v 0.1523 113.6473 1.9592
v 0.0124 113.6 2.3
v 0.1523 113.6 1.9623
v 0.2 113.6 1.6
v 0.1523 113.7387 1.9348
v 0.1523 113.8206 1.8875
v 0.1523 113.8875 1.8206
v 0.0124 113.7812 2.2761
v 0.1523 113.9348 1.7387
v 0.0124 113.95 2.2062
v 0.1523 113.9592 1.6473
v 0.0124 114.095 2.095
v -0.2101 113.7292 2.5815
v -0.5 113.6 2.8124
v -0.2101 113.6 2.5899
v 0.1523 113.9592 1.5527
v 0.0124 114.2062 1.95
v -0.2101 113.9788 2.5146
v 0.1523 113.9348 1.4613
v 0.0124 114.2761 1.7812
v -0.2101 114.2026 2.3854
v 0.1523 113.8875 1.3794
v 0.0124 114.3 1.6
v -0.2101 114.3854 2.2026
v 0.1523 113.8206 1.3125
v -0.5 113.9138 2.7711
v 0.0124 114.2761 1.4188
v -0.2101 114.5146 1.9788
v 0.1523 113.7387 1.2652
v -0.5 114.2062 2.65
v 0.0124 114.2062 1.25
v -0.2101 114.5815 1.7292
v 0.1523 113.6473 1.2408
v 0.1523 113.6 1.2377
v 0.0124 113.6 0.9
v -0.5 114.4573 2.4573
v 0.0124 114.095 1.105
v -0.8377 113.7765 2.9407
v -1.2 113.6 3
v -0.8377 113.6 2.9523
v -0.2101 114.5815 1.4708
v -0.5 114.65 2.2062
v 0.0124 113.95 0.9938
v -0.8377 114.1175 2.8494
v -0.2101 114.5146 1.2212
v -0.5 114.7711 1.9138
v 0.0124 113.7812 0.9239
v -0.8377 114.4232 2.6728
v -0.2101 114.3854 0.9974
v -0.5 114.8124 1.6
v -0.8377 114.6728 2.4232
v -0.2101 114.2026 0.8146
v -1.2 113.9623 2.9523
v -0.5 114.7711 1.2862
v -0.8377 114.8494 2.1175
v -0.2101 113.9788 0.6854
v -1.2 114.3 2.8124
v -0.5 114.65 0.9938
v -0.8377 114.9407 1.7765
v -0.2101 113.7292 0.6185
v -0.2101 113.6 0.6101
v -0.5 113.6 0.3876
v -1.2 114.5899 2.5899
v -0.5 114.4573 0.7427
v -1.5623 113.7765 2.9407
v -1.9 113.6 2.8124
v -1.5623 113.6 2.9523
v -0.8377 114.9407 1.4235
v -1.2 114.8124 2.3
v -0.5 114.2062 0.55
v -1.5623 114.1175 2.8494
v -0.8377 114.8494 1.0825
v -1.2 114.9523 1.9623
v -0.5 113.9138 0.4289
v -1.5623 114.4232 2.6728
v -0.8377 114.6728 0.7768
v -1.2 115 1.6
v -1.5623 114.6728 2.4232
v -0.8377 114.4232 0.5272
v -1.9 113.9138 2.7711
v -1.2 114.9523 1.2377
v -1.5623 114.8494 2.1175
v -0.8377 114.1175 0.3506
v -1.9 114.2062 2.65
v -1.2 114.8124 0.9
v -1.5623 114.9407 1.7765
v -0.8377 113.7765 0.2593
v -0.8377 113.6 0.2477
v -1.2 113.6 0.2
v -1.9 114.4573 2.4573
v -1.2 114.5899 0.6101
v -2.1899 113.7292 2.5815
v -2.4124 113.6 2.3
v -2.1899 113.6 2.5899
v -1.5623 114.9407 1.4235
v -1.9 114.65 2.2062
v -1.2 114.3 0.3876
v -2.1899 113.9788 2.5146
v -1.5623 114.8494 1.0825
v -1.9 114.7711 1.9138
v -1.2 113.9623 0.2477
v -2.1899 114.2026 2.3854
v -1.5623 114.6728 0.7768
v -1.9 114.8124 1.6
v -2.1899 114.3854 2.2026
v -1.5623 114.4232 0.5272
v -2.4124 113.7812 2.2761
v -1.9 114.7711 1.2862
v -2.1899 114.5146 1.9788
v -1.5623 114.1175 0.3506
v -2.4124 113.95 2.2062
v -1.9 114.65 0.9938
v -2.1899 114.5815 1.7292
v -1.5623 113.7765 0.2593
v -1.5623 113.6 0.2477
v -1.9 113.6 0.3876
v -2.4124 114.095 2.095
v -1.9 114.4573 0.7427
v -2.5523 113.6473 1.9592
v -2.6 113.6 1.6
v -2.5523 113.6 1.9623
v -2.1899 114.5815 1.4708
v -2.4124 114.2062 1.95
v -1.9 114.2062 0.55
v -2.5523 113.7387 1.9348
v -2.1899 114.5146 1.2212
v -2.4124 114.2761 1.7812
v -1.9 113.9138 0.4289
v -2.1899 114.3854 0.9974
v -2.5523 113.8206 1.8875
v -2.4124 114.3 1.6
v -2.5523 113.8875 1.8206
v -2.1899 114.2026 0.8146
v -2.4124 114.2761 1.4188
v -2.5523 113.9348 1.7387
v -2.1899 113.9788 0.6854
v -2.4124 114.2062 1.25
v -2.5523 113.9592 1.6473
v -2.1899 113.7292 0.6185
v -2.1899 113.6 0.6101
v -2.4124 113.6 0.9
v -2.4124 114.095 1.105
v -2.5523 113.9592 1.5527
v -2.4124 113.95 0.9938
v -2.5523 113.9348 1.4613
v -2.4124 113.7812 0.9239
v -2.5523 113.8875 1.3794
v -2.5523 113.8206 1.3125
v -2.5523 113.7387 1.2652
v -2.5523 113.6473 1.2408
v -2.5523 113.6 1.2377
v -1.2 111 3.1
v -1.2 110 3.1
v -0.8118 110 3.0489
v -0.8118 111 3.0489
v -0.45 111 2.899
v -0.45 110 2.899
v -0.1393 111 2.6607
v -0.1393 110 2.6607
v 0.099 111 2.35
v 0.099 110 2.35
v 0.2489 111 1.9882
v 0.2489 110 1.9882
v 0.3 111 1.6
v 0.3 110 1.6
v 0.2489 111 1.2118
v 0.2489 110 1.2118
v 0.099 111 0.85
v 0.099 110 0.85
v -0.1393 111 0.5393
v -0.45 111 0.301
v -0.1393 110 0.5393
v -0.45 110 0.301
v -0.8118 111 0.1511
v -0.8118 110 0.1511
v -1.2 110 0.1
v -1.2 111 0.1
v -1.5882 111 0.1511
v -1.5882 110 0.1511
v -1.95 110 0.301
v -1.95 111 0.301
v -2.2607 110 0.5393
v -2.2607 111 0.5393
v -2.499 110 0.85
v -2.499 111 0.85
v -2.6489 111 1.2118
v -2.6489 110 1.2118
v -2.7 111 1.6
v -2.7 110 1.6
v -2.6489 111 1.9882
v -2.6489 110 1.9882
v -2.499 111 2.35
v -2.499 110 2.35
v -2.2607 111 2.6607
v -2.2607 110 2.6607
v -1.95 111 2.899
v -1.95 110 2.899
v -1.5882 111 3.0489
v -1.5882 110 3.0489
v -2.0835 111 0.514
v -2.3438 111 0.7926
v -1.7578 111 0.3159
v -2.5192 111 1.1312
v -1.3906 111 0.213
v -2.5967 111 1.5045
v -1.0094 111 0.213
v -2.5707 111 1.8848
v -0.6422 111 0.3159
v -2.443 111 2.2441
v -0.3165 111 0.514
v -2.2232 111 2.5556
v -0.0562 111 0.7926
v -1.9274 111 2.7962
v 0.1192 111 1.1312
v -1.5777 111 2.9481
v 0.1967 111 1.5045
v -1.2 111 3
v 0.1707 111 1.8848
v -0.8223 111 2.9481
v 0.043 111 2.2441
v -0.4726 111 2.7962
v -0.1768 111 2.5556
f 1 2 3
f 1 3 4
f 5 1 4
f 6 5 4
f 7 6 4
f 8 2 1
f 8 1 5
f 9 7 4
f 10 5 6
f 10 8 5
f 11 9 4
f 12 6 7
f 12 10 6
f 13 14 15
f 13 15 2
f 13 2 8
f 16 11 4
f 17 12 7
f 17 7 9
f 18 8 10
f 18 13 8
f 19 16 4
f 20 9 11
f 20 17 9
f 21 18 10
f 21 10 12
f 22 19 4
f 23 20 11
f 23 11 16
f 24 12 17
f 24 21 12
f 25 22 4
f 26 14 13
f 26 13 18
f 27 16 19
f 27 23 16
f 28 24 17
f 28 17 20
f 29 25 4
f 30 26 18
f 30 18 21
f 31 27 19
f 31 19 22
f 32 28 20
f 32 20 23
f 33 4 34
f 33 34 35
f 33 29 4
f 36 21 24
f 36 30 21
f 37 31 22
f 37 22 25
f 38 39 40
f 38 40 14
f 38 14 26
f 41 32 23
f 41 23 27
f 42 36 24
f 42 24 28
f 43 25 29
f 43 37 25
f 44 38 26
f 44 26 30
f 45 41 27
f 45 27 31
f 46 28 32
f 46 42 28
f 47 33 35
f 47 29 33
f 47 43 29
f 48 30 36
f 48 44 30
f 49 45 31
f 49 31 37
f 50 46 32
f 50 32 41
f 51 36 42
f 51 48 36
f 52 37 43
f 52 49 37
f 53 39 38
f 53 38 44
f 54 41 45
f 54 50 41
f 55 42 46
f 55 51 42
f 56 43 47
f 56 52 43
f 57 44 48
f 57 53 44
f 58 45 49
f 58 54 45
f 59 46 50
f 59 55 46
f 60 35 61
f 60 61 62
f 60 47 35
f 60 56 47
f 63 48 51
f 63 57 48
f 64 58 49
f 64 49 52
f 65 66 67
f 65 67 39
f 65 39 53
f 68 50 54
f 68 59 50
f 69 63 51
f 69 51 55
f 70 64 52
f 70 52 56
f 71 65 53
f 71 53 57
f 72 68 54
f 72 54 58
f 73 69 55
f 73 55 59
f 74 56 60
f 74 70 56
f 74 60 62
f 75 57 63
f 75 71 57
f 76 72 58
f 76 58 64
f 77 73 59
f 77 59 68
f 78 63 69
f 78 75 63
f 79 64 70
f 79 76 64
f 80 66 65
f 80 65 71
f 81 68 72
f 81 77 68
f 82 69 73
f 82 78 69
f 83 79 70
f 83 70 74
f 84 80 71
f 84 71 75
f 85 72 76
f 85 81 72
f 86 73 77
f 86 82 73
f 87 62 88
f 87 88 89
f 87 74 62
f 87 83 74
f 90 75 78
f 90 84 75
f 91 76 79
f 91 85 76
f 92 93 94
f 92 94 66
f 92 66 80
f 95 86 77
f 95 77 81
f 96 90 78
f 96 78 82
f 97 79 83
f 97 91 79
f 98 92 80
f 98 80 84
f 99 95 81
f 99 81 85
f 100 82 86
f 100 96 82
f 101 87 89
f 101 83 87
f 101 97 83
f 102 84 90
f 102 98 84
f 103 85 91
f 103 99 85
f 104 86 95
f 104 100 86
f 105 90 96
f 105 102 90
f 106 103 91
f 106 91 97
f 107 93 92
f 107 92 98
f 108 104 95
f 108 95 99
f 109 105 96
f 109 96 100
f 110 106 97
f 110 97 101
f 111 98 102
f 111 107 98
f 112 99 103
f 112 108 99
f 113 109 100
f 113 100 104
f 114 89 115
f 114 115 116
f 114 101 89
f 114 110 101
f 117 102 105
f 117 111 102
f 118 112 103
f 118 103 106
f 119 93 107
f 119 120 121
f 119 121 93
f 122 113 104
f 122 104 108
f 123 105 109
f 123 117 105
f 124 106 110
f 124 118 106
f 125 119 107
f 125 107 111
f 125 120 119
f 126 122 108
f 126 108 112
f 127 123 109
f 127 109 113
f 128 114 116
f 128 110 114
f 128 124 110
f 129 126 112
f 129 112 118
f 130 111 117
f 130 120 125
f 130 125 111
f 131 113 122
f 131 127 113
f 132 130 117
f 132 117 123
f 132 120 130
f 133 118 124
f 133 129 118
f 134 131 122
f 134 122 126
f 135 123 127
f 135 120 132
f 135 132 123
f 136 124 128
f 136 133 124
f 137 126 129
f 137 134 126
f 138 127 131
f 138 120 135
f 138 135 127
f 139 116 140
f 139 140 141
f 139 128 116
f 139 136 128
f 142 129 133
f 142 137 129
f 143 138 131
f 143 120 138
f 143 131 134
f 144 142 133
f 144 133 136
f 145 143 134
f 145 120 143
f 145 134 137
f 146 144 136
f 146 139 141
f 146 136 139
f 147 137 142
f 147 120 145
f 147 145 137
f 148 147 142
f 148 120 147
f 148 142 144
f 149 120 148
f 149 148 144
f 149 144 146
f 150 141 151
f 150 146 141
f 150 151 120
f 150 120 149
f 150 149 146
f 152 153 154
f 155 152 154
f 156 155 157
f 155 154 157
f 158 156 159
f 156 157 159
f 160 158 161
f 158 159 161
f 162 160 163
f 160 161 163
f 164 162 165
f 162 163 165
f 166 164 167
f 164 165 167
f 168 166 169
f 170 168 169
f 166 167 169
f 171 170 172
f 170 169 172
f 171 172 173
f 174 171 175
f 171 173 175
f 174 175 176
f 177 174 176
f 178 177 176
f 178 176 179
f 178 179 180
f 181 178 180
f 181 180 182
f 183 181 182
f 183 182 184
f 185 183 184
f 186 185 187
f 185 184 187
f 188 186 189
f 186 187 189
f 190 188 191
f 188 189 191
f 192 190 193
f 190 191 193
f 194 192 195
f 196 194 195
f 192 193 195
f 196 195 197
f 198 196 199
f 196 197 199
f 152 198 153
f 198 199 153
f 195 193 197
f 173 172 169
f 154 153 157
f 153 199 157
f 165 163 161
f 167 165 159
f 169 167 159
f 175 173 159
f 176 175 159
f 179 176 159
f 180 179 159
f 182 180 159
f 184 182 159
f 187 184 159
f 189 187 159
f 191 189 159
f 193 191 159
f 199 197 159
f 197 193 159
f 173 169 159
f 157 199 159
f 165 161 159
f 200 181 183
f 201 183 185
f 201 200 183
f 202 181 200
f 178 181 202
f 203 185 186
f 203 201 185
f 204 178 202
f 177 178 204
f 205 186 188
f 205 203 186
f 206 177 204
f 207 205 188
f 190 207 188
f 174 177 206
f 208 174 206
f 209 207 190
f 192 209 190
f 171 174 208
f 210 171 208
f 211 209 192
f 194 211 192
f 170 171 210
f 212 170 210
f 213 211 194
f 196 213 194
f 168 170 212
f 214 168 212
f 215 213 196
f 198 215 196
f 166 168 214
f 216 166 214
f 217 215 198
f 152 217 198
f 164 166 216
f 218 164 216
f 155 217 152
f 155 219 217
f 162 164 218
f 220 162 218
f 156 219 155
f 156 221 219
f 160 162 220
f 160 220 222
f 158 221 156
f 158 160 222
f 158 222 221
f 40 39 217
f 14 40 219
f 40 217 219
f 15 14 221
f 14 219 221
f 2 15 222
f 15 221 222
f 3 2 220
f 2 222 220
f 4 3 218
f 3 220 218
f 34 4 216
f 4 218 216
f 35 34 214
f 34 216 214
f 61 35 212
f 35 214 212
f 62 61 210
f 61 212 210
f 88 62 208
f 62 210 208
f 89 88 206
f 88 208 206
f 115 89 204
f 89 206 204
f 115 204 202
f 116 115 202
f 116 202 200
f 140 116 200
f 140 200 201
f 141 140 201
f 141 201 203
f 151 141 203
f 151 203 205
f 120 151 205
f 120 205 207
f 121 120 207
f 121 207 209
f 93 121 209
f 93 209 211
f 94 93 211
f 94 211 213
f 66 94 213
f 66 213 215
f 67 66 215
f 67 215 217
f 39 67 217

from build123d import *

# Parameters (mm, degrees)
CYLINDER002_R          = 1.5
CYLINDER002_DEPTH      = 1
SPHERE_ANGLE           = 180
SPHERE_ROLL_ANGLE      = 90
CYLINDER003_R          = 1.4
CYLINDER003_DEPTH      = 3.6
FUSION_PITCH_ANGLE     = -90
FUSION_PLACEMENT_ANGLE = -90


with BuildPart() as cilindro002:
    # Cylinder002 → Cylinder002 (new body)
    with BuildSketch(Plane.XY):
        Circle(CYLINDER002_R)
    extrude(amount=CYLINDER002_DEPTH)


with BuildPart() as esf_ra:
    # Sphere → Sphere (revolve)
    with BuildSketch(Plane.XZ):
        with BuildLine():
            ThreePointArc((0, -1.4), (1.4, 0), (0, 1.4))
            Line((0, 1.4), (0, -1.4))
        make_face()
    revolve(axis=Axis((0, 0, 0), (0, 0, 1)), revolution_arc=SPHERE_ANGLE)


with BuildPart() as esf_ra_1:
    # Sphere roll: moved
    add(esf_ra.part.rotate(Axis((0, 0, 0), (1, 0, 0)), SPHERE_ROLL_ANGLE))


with BuildPart() as esf_ra_2:
    # Sphere placement: moved
    add(esf_ra_1.part.moved(Location((0, 0, 3.6))))


with BuildPart() as fundaled:
    # Cylinder003 → Cylinder003 (new body)
    with BuildSketch(Plane.XY):
        Circle(CYLINDER003_R)
    extrude(amount=CYLINDER003_DEPTH)

    # Fusion: union Cilindro002, Esféra
    add(cilindro002.part)
    add(esf_ra_2.part)


with BuildPart() as fundaled_1:
    # Fusion pitch: moved
    add(fundaled.part.rotate(Axis((0, 0, 0), (0, 1, 0)), FUSION_PITCH_ANGLE))


with BuildPart() as fundaled_2:
    # Fusion placement: moved
    add(fundaled_1.part.moved(Location((-1.2, 110, 1.6))).rotate(Axis((-1.2, 110, 1.6), (0, 0, 1)), FUSION_PLACEMENT_ANGLE))


solid = fundaled_2.part
